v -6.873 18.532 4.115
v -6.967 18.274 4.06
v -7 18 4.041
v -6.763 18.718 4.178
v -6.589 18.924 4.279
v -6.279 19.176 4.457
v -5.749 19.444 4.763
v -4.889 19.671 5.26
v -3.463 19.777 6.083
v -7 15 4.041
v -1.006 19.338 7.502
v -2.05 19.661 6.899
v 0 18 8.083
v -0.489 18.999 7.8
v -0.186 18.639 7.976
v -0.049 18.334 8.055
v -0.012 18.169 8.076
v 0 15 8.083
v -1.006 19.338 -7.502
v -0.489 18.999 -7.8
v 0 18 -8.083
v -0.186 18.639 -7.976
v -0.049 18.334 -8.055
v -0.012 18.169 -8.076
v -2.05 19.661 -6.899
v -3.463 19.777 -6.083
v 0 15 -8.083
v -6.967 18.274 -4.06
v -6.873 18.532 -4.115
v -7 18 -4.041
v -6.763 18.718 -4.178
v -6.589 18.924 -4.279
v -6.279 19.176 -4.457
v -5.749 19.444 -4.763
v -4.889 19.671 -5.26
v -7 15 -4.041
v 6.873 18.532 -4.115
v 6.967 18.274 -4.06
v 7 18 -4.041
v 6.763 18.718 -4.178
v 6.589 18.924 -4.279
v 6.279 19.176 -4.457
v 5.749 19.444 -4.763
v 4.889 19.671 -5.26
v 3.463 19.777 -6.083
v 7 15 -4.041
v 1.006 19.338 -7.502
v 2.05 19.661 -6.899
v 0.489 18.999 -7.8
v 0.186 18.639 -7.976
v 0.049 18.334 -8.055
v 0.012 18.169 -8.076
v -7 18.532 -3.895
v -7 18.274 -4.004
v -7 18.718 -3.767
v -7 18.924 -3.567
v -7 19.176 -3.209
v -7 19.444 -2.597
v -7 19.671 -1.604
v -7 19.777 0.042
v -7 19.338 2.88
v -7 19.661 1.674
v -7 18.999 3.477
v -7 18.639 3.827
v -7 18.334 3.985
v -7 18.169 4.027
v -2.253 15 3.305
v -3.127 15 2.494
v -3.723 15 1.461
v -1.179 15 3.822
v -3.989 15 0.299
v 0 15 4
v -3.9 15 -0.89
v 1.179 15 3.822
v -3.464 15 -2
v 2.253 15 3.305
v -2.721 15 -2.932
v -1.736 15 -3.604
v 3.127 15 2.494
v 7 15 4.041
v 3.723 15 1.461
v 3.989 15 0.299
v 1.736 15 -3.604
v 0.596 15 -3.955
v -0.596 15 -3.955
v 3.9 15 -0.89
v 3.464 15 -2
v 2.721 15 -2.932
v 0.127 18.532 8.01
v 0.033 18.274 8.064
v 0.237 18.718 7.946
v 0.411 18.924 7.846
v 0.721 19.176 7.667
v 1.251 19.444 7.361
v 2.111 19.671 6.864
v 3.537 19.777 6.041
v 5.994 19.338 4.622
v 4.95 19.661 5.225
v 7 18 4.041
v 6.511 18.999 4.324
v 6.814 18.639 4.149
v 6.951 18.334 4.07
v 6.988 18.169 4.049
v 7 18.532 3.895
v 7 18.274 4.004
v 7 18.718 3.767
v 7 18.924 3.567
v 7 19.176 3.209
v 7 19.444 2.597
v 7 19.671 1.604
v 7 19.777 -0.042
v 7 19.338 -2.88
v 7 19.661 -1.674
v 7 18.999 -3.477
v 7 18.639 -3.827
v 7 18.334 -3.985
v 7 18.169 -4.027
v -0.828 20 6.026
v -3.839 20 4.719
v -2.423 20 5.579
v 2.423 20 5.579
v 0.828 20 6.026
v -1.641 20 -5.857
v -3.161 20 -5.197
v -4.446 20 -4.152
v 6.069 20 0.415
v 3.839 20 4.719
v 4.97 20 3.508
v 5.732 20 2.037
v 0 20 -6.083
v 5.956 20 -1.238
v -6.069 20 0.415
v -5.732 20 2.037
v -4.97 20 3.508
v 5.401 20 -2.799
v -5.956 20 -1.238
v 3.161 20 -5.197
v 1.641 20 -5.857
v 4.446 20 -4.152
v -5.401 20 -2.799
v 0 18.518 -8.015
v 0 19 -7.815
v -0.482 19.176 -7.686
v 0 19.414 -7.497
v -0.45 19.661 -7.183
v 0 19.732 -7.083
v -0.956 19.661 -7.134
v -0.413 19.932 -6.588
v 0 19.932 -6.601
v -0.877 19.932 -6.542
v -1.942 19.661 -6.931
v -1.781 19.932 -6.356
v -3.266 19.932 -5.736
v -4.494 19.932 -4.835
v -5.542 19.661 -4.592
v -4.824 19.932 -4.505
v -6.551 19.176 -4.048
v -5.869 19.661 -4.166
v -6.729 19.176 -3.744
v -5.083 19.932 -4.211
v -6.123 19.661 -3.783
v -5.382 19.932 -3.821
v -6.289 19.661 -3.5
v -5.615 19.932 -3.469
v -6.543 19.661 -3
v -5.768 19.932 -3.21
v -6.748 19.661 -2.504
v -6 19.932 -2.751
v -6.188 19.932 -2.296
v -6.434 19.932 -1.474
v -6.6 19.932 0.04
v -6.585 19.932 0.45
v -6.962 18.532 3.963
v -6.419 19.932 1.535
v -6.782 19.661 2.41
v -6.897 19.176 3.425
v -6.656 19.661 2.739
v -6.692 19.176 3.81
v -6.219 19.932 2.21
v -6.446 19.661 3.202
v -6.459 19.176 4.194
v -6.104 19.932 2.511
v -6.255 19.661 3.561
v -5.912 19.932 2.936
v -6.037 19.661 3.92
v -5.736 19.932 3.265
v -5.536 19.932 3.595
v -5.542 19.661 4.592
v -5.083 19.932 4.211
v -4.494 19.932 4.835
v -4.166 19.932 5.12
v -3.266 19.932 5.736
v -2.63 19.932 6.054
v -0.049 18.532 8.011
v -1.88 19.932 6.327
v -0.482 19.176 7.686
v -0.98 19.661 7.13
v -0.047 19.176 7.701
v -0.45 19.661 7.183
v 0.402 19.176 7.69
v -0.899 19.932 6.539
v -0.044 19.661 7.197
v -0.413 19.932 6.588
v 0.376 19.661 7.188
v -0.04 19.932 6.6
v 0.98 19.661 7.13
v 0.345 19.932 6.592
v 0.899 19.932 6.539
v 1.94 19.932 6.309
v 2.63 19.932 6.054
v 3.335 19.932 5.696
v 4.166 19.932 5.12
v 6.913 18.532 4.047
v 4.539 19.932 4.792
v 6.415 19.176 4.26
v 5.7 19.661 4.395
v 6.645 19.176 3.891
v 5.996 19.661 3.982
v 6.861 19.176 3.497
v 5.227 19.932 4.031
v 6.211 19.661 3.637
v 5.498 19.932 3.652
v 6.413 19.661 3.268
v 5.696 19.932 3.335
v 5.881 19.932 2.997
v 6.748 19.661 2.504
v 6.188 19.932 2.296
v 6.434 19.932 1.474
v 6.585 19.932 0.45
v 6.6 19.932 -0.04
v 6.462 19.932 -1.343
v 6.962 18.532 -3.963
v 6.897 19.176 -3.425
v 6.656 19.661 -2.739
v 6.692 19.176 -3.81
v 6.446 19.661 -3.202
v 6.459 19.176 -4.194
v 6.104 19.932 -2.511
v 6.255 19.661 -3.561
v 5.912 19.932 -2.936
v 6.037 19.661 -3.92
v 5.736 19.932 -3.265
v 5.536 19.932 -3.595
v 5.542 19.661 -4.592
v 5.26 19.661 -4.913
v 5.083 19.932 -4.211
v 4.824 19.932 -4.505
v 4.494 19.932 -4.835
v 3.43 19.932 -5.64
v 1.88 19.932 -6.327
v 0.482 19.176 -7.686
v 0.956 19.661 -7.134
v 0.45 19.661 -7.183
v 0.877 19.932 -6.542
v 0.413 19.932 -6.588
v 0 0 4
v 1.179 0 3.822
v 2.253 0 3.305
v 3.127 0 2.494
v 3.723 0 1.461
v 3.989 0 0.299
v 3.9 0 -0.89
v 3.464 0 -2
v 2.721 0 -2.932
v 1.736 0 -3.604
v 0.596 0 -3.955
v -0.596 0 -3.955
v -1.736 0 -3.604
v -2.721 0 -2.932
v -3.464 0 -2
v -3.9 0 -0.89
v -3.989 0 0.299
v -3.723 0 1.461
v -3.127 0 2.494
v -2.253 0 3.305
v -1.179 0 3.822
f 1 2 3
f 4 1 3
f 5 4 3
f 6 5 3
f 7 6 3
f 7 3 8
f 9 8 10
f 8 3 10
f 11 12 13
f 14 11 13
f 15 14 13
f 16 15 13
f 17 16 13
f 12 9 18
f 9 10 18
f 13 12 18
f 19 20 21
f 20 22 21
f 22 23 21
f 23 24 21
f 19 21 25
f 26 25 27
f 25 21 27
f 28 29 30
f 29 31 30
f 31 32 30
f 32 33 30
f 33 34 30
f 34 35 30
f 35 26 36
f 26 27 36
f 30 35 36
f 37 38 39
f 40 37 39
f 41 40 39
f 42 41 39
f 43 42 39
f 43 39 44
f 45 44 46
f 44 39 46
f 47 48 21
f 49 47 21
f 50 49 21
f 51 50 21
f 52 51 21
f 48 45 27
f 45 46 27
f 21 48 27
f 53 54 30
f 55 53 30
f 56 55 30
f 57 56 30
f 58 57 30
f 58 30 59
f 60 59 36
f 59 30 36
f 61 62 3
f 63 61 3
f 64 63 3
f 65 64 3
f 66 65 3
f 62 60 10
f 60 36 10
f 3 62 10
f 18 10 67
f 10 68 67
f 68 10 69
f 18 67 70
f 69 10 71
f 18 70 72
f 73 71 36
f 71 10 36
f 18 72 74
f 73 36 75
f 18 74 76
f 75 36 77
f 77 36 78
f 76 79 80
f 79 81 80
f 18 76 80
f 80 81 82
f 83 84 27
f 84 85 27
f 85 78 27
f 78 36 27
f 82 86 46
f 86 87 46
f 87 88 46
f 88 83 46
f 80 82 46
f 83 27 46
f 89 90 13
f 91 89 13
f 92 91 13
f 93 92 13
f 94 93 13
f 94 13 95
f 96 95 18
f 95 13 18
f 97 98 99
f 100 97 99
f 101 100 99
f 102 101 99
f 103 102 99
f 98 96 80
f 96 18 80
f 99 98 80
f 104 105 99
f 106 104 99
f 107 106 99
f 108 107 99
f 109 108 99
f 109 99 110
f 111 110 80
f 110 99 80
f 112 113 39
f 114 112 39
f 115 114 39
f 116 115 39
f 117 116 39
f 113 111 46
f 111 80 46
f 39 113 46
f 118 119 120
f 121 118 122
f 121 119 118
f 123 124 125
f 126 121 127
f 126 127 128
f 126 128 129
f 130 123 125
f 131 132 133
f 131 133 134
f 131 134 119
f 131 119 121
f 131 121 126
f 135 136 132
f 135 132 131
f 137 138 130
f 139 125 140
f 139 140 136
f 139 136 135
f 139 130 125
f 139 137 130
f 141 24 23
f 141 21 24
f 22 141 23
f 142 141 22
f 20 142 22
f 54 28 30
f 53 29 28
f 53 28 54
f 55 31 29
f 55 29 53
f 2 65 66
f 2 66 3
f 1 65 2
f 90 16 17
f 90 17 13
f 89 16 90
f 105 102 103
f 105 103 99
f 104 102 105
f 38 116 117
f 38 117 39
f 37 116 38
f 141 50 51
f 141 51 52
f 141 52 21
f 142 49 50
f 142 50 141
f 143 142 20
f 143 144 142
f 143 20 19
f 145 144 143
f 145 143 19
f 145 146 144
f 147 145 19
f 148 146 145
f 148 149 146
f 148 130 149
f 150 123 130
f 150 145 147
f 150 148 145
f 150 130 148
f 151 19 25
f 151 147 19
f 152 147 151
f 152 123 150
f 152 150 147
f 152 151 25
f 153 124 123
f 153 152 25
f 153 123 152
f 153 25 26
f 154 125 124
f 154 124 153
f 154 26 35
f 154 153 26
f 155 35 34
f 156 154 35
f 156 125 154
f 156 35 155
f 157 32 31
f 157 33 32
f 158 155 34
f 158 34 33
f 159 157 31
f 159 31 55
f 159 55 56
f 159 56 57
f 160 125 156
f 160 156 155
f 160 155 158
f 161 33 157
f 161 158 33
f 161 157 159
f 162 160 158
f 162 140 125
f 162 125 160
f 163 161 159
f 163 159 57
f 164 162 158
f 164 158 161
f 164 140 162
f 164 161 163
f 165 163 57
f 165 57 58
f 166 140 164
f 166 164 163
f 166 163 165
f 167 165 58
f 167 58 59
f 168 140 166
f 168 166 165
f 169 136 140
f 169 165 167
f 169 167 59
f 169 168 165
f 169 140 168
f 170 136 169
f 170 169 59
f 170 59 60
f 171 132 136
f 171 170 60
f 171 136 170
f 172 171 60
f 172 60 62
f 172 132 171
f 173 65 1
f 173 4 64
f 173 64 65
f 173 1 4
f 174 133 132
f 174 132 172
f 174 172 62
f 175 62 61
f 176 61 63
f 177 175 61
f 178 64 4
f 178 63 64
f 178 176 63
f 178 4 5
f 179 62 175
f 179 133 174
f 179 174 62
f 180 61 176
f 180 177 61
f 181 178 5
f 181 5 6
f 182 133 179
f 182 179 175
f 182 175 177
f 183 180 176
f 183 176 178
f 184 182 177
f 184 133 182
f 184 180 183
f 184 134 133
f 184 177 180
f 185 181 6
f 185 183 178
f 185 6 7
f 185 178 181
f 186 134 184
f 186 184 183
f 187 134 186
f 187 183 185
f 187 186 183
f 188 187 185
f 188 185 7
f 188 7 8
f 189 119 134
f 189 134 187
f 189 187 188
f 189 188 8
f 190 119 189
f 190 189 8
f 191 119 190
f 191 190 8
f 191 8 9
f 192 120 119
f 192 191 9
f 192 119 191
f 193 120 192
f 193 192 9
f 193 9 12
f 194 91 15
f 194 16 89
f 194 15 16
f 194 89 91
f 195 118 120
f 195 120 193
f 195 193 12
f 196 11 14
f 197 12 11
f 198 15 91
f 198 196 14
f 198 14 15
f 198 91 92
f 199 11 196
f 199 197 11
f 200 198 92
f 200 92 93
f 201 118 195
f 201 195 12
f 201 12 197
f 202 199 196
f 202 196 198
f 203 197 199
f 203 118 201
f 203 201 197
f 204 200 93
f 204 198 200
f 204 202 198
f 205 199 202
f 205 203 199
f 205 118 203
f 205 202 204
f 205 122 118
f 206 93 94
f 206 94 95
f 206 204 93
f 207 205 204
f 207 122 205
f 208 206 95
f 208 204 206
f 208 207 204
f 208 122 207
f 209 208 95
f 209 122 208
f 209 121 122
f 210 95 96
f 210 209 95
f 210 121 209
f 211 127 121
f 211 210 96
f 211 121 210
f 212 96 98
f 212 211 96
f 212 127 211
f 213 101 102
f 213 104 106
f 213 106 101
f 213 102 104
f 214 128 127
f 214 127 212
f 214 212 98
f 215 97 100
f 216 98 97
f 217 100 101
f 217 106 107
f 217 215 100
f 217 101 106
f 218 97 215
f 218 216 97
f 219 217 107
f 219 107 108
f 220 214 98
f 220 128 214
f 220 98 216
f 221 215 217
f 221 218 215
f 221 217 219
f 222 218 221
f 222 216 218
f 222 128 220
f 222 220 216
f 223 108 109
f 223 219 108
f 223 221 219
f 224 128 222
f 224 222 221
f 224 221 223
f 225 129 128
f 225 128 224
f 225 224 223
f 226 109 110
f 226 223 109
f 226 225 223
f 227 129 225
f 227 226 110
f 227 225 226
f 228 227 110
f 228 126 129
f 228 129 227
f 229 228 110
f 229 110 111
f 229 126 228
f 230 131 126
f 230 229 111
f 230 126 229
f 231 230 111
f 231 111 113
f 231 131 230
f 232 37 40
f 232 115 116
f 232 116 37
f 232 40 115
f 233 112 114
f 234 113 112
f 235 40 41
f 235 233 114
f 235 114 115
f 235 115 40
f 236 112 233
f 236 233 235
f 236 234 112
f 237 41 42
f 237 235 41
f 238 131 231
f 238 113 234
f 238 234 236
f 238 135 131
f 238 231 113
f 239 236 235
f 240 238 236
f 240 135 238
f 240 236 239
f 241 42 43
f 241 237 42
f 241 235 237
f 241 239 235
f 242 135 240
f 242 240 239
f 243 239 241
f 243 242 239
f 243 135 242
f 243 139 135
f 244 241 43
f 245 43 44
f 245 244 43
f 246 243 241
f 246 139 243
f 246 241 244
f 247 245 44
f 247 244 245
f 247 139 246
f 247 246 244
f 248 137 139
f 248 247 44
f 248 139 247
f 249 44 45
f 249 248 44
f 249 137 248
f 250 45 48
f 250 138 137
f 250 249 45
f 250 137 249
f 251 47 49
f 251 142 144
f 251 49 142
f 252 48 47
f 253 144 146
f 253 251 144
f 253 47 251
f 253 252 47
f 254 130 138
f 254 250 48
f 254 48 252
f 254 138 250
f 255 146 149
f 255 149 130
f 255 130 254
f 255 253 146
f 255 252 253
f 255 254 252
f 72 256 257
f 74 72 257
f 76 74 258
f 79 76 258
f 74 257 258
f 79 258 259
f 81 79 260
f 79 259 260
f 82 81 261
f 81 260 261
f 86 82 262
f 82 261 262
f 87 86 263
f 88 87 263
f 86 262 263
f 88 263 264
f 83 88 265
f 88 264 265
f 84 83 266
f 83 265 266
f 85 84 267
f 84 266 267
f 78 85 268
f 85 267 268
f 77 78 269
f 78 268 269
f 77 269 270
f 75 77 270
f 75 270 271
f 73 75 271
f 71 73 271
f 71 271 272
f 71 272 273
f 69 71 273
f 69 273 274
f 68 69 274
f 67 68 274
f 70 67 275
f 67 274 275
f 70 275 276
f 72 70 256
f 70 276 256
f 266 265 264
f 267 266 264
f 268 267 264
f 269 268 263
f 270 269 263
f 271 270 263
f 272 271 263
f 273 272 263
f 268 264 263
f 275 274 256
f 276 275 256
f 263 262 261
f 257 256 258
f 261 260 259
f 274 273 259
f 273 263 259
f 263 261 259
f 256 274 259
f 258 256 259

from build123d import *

# Parameters (mm, degrees)
SKETCH1_R           = 4
BOSS_EXTRUDE1_DEPTH = 15
BOSS_EXTRUDE2_DEPTH = 5


with BuildPart() as part:
    # Sketch1 → Boss-Extrude1 (new body)
    with BuildSketch(Plane(origin=(0, 0, 0), x_dir=(1, 0, 0), z_dir=(0, 1, 0))):
        with Locations(Location((0, 0, 0), (0, 0, 270))):
            Circle(SKETCH1_R)
    extrude(amount=BOSS_EXTRUDE1_DEPTH)

    # Sketch2 → Boss-Extrude2 (add)
    with BuildSketch(Plane(origin=(0, 15, 0), x_dir=(1, 0, 0), z_dir=(0, 1, 0))):
        Polygon((0, -8.082903769), (7, -4.041451884), (7, 4.041451884), (0, 8.082903769), (-7, 4.041451884), (-7, -4.041451884), align=None)
    extrude(amount=BOSS_EXTRUDE2_DEPTH)

    # Sketch4 → Cut-Revolve2 (revolve, cut)
    with BuildSketch(Plane(origin=(0, 0, 0), x_dir=(0, 0, -1), z_dir=(1, 0, 0)), mode=Mode.PRIVATE) as cut_revolve2_sk:
        with BuildLine():
            Line((-6.082903769, 20), (-8.082903769, 20))
            Line((-8.082903769, 20), (-8.082903769, 18))
            ThreePointArc((-8.082903769, 18), (-7.497117331, 19.414213562), (-6.082903769, 20))
        make_face()
    revolve(cut_revolve2_sk.sketch.rotate(Axis((0, 0, 0), (0, 1, 0)), 180), axis=Axis((0, 0, 0), (0, 1, 0)), mode=Mode.SUBTRACT)


solid = part.part
